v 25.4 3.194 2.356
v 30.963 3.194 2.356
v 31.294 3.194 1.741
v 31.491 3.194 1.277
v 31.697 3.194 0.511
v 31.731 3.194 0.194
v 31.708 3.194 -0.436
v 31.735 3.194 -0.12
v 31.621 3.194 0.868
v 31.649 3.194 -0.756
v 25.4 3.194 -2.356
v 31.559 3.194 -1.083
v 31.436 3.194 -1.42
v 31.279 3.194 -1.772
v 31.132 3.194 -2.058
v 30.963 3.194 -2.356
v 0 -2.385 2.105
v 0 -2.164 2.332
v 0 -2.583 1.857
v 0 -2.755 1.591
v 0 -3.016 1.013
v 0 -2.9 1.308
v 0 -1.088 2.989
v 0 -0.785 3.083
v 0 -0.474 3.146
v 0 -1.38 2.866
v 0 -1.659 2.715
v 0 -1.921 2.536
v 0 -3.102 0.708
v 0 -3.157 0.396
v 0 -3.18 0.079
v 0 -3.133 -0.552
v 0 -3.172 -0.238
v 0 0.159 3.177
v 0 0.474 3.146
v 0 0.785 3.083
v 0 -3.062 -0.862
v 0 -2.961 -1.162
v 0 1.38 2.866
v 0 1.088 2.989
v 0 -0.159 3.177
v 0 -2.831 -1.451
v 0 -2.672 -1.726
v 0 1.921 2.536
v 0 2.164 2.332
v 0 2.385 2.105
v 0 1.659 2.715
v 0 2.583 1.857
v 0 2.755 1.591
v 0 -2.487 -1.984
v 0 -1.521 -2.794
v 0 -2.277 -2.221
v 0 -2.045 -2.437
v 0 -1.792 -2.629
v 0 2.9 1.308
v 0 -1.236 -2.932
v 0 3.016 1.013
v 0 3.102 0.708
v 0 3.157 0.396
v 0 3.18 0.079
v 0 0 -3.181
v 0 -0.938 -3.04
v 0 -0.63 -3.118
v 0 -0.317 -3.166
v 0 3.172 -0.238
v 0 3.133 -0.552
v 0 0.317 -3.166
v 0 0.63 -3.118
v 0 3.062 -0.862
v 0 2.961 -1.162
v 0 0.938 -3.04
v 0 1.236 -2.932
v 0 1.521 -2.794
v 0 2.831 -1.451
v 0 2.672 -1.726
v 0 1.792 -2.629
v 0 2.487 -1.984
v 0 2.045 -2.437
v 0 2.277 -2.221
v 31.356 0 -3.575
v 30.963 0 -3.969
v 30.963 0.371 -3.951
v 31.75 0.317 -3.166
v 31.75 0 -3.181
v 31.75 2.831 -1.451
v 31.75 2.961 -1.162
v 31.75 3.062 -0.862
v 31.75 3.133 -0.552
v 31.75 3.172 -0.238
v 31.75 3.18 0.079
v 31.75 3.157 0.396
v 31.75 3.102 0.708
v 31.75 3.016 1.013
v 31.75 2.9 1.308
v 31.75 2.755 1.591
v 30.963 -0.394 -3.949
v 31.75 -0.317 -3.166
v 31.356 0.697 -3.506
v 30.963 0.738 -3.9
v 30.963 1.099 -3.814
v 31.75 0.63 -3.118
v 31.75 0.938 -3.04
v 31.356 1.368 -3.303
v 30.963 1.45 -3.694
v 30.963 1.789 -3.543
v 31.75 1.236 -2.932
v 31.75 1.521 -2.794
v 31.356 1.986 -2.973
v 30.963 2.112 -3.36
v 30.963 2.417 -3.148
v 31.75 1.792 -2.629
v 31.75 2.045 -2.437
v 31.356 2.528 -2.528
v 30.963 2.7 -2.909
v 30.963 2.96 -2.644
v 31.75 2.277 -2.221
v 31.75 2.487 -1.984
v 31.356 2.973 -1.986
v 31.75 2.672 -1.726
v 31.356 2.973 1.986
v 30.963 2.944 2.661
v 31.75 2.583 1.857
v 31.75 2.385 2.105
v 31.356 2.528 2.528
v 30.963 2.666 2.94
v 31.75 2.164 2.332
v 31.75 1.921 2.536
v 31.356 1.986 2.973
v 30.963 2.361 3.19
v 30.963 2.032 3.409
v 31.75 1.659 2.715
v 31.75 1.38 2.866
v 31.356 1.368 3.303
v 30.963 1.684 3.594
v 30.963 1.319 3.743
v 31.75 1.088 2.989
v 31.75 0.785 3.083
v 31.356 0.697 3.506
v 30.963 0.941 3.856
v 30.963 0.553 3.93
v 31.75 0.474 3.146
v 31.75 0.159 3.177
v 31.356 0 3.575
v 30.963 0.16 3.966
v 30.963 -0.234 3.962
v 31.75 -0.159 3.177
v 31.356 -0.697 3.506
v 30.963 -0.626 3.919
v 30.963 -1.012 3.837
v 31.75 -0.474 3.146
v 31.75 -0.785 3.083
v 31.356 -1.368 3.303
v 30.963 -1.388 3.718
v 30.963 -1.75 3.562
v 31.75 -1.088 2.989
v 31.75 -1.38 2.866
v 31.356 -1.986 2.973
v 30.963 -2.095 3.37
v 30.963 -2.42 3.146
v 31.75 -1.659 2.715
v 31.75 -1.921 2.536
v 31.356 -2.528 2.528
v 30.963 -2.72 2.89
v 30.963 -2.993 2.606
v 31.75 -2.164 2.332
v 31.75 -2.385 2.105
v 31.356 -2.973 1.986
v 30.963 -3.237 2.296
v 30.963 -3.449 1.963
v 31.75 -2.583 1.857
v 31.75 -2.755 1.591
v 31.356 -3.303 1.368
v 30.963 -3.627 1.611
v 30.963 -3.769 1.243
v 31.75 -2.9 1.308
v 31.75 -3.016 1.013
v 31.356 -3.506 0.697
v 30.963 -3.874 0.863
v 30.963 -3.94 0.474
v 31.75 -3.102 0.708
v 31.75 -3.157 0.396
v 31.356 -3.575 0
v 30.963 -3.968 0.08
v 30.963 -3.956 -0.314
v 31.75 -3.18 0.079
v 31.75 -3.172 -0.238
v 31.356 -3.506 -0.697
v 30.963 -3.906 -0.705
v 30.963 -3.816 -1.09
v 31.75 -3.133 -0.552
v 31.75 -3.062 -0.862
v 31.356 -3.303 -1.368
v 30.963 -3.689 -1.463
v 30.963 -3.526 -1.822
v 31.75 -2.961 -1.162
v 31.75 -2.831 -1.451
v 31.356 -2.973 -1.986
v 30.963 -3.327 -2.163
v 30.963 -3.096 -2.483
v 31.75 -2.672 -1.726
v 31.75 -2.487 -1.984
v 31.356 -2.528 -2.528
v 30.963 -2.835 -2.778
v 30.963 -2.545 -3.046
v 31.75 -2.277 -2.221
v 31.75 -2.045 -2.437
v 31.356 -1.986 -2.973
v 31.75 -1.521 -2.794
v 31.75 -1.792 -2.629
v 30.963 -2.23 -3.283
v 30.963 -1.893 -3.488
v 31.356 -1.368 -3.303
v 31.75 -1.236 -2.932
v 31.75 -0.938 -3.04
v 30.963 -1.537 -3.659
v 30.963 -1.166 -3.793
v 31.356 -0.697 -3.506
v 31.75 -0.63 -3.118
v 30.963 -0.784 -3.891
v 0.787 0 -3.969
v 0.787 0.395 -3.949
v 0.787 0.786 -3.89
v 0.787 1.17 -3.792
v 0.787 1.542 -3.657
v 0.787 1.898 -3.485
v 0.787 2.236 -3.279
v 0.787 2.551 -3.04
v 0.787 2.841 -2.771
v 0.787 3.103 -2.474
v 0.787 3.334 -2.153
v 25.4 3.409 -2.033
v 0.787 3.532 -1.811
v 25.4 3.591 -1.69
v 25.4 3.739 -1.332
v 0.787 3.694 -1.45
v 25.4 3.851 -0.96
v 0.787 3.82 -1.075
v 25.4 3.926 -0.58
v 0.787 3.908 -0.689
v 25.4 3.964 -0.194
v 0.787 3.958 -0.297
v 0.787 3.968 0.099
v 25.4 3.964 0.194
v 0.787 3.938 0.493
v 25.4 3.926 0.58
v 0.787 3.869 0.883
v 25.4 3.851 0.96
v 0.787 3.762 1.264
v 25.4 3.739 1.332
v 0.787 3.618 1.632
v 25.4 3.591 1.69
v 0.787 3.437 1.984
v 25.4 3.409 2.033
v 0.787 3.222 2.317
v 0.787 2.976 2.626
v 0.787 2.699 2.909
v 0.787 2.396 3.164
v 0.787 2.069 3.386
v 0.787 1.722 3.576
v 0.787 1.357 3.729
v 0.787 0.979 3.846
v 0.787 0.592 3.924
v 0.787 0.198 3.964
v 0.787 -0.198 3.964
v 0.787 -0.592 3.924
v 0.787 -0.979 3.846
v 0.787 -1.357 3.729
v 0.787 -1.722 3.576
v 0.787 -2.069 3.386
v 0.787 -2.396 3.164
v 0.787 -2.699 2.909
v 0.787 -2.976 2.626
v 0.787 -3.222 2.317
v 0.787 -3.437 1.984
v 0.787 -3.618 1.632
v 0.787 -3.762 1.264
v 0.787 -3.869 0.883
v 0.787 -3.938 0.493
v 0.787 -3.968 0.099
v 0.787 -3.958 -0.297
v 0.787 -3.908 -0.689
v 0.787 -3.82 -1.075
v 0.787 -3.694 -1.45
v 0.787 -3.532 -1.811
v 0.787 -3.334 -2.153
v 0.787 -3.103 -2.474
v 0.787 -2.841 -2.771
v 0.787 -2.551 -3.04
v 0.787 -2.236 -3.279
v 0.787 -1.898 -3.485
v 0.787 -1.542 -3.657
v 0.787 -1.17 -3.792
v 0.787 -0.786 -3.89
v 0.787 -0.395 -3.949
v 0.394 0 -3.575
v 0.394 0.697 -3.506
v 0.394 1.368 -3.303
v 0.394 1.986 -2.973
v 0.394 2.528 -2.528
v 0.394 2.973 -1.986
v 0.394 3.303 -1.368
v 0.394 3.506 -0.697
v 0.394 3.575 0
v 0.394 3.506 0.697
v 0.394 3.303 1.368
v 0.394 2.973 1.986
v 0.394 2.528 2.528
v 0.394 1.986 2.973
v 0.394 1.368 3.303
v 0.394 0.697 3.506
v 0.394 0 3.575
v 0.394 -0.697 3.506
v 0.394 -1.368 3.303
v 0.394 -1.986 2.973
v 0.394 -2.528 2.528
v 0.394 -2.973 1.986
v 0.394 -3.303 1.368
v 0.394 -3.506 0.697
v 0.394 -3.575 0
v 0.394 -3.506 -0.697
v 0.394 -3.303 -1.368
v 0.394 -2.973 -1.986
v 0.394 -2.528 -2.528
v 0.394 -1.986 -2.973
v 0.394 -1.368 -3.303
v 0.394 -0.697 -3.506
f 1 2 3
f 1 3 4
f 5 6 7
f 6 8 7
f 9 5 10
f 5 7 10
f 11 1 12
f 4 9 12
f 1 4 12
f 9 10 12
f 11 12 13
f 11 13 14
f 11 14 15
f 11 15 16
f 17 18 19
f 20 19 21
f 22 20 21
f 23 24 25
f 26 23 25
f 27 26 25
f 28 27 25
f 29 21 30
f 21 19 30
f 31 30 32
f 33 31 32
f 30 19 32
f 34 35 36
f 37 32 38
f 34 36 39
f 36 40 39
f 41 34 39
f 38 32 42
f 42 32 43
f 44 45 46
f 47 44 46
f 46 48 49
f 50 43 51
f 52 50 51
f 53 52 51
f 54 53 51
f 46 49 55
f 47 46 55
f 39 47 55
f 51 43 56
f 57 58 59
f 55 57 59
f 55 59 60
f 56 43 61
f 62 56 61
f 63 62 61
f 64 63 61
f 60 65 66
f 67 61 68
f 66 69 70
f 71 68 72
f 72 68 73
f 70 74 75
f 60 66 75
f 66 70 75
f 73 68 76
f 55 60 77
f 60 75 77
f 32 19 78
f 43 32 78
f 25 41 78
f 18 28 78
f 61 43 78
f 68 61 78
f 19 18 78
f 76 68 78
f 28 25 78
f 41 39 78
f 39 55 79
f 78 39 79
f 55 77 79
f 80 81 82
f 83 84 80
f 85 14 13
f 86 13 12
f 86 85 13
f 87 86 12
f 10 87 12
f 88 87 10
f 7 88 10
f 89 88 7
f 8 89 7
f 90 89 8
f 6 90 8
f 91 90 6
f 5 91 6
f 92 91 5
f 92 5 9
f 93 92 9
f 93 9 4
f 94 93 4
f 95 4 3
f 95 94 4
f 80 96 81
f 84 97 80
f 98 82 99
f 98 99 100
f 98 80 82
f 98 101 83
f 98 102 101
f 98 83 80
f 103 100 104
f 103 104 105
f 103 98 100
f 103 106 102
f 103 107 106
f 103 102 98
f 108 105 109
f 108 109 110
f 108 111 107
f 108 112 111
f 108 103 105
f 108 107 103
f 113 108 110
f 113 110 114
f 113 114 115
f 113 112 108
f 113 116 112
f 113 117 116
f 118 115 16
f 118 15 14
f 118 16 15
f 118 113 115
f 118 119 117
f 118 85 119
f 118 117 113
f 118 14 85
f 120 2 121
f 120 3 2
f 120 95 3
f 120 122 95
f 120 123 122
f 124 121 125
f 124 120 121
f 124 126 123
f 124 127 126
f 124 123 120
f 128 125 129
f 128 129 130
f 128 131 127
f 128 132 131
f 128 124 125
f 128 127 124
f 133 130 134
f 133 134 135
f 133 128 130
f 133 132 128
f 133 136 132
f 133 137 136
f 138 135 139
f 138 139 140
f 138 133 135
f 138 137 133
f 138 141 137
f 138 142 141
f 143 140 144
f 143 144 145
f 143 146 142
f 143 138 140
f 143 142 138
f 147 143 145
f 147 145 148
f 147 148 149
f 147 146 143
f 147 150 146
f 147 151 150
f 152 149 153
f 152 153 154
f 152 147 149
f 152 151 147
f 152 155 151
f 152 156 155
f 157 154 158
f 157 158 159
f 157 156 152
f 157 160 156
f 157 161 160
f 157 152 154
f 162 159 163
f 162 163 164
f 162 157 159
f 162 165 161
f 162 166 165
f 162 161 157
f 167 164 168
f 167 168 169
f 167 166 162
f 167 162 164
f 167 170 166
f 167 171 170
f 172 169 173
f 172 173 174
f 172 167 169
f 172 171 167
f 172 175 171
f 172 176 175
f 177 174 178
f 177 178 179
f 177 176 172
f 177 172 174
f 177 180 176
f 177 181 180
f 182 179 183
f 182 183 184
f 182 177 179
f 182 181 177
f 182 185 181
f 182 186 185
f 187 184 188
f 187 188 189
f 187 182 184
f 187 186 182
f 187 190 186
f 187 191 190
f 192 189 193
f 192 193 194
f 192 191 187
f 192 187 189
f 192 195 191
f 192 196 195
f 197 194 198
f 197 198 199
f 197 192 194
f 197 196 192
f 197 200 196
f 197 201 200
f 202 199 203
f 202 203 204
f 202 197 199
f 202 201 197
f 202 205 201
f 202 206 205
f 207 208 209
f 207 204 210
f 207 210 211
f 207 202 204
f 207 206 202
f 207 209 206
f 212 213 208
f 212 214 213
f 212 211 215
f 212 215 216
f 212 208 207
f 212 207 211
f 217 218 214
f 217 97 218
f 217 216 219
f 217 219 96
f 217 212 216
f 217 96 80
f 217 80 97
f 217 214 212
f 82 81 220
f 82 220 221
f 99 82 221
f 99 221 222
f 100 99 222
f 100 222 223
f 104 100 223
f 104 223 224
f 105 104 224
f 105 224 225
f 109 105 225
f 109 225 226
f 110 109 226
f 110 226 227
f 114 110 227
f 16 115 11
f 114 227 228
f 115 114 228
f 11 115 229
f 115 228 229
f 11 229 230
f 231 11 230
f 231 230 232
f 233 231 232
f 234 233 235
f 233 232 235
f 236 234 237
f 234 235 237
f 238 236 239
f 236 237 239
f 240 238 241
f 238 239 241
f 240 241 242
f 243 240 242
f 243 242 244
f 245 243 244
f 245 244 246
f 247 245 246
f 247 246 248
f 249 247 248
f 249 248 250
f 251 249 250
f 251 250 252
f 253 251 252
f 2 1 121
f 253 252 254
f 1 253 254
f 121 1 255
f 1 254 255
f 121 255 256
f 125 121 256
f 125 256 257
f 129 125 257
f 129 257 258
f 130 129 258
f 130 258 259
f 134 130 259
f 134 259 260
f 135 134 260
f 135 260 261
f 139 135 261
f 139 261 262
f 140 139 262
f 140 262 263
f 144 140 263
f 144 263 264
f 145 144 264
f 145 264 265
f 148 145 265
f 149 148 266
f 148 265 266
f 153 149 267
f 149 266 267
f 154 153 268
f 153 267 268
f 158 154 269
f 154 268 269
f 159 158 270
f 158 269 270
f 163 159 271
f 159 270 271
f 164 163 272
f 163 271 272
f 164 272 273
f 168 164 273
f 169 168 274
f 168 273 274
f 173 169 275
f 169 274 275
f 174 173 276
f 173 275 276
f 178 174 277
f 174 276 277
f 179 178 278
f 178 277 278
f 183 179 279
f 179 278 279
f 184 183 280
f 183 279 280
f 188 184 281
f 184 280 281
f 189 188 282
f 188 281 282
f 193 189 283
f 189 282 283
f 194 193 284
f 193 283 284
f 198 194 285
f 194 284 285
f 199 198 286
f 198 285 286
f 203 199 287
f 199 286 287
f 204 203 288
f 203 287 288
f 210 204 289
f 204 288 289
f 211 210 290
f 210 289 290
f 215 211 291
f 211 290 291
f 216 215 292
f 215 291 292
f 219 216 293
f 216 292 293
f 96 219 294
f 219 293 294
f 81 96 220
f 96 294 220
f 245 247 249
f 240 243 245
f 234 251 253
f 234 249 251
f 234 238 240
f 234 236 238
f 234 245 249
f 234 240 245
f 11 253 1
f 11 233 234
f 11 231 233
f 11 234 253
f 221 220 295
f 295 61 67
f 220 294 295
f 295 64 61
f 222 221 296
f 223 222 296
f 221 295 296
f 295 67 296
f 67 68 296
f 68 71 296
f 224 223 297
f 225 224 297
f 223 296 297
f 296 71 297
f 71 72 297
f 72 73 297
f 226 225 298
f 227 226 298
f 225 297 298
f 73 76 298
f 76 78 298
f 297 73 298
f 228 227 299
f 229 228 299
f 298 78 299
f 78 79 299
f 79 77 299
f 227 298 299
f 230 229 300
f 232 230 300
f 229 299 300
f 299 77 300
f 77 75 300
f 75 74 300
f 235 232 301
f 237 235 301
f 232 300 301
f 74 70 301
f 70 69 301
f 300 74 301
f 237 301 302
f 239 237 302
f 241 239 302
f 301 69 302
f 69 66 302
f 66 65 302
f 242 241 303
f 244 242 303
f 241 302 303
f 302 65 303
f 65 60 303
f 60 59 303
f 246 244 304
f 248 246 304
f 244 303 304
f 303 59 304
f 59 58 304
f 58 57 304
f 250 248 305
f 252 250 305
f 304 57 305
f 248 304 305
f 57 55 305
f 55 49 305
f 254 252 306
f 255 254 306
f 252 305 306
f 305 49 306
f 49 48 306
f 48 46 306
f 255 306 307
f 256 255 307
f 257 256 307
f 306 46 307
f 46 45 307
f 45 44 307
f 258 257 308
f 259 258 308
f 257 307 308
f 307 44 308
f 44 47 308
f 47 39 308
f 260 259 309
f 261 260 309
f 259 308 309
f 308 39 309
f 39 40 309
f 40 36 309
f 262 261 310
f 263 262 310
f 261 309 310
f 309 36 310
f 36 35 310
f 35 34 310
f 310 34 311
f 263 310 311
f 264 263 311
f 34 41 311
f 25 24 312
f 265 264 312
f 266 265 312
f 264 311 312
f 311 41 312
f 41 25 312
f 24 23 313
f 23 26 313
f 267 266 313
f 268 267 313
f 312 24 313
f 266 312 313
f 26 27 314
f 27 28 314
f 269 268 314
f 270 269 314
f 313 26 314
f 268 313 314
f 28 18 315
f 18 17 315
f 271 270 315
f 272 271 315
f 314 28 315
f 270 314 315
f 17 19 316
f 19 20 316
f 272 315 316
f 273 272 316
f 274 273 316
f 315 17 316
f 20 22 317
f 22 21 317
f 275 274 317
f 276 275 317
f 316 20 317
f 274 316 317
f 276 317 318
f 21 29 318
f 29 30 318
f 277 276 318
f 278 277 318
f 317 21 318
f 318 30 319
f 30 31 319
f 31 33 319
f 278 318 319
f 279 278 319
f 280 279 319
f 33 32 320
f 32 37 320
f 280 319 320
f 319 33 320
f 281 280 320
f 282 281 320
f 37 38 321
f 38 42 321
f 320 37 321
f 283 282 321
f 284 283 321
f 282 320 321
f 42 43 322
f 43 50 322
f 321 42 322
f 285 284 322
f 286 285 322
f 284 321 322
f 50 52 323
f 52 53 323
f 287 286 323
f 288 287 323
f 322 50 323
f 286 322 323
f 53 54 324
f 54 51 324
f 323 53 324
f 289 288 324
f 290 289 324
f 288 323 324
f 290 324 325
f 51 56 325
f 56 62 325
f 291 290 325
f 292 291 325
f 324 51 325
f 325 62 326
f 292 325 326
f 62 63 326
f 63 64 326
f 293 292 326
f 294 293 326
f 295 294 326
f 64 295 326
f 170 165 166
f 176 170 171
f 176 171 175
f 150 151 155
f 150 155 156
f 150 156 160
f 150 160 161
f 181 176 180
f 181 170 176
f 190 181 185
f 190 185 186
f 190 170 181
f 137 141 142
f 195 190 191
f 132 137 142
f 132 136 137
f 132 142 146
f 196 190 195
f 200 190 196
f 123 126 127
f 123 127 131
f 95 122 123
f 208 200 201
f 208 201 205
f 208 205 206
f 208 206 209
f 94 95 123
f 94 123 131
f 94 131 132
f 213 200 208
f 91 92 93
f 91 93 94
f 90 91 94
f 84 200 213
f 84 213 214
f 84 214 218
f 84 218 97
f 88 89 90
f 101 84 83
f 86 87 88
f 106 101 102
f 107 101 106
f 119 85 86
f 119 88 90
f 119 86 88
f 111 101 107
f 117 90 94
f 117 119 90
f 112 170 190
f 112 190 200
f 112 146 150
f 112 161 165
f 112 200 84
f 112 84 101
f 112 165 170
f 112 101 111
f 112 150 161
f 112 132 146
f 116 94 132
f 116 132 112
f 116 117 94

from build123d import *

# Parameters (mm, degrees)
SKETCH1_R      = 3.96875
EXTRUDE1_DEPTH = 31.75
CHAMFER1_SIZE  = 0.7874
SKETCH2_W      = 7.62
SKETCH2_H      = 1.27
EXTRUDE2_DEPTH = 6.35


with BuildPart() as part:
    # Sketch1 → Extrude1 (new body)
    with BuildSketch(Plane(origin=(0, 0, 0), x_dir=(0, 0, -1), z_dir=(1, 0, 0))):
        Circle(SKETCH1_R)
    extrude(amount=EXTRUDE1_DEPTH)

    # Chamfer1
    chamfer1_edges = [part.edges().sort_by_distance(p)[0] for p in [
        (0, 0, 3.96875),
        (31.75, 0, 3.96875),
    ]]
    chamfer(chamfer1_edges, length=CHAMFER1_SIZE)

    # Sketch2 → Extrude2 (cut)
    with BuildSketch(Plane(origin=(31.75, 0, 0), x_dir=(0, 0, -1), z_dir=(1, 0, 0))):
        with Locations((0, 3.82905)):
            Rectangle(SKETCH2_W, SKETCH2_H)
    extrude(amount=-EXTRUDE2_DEPTH, mode=Mode.SUBTRACT)


solid = part.part
